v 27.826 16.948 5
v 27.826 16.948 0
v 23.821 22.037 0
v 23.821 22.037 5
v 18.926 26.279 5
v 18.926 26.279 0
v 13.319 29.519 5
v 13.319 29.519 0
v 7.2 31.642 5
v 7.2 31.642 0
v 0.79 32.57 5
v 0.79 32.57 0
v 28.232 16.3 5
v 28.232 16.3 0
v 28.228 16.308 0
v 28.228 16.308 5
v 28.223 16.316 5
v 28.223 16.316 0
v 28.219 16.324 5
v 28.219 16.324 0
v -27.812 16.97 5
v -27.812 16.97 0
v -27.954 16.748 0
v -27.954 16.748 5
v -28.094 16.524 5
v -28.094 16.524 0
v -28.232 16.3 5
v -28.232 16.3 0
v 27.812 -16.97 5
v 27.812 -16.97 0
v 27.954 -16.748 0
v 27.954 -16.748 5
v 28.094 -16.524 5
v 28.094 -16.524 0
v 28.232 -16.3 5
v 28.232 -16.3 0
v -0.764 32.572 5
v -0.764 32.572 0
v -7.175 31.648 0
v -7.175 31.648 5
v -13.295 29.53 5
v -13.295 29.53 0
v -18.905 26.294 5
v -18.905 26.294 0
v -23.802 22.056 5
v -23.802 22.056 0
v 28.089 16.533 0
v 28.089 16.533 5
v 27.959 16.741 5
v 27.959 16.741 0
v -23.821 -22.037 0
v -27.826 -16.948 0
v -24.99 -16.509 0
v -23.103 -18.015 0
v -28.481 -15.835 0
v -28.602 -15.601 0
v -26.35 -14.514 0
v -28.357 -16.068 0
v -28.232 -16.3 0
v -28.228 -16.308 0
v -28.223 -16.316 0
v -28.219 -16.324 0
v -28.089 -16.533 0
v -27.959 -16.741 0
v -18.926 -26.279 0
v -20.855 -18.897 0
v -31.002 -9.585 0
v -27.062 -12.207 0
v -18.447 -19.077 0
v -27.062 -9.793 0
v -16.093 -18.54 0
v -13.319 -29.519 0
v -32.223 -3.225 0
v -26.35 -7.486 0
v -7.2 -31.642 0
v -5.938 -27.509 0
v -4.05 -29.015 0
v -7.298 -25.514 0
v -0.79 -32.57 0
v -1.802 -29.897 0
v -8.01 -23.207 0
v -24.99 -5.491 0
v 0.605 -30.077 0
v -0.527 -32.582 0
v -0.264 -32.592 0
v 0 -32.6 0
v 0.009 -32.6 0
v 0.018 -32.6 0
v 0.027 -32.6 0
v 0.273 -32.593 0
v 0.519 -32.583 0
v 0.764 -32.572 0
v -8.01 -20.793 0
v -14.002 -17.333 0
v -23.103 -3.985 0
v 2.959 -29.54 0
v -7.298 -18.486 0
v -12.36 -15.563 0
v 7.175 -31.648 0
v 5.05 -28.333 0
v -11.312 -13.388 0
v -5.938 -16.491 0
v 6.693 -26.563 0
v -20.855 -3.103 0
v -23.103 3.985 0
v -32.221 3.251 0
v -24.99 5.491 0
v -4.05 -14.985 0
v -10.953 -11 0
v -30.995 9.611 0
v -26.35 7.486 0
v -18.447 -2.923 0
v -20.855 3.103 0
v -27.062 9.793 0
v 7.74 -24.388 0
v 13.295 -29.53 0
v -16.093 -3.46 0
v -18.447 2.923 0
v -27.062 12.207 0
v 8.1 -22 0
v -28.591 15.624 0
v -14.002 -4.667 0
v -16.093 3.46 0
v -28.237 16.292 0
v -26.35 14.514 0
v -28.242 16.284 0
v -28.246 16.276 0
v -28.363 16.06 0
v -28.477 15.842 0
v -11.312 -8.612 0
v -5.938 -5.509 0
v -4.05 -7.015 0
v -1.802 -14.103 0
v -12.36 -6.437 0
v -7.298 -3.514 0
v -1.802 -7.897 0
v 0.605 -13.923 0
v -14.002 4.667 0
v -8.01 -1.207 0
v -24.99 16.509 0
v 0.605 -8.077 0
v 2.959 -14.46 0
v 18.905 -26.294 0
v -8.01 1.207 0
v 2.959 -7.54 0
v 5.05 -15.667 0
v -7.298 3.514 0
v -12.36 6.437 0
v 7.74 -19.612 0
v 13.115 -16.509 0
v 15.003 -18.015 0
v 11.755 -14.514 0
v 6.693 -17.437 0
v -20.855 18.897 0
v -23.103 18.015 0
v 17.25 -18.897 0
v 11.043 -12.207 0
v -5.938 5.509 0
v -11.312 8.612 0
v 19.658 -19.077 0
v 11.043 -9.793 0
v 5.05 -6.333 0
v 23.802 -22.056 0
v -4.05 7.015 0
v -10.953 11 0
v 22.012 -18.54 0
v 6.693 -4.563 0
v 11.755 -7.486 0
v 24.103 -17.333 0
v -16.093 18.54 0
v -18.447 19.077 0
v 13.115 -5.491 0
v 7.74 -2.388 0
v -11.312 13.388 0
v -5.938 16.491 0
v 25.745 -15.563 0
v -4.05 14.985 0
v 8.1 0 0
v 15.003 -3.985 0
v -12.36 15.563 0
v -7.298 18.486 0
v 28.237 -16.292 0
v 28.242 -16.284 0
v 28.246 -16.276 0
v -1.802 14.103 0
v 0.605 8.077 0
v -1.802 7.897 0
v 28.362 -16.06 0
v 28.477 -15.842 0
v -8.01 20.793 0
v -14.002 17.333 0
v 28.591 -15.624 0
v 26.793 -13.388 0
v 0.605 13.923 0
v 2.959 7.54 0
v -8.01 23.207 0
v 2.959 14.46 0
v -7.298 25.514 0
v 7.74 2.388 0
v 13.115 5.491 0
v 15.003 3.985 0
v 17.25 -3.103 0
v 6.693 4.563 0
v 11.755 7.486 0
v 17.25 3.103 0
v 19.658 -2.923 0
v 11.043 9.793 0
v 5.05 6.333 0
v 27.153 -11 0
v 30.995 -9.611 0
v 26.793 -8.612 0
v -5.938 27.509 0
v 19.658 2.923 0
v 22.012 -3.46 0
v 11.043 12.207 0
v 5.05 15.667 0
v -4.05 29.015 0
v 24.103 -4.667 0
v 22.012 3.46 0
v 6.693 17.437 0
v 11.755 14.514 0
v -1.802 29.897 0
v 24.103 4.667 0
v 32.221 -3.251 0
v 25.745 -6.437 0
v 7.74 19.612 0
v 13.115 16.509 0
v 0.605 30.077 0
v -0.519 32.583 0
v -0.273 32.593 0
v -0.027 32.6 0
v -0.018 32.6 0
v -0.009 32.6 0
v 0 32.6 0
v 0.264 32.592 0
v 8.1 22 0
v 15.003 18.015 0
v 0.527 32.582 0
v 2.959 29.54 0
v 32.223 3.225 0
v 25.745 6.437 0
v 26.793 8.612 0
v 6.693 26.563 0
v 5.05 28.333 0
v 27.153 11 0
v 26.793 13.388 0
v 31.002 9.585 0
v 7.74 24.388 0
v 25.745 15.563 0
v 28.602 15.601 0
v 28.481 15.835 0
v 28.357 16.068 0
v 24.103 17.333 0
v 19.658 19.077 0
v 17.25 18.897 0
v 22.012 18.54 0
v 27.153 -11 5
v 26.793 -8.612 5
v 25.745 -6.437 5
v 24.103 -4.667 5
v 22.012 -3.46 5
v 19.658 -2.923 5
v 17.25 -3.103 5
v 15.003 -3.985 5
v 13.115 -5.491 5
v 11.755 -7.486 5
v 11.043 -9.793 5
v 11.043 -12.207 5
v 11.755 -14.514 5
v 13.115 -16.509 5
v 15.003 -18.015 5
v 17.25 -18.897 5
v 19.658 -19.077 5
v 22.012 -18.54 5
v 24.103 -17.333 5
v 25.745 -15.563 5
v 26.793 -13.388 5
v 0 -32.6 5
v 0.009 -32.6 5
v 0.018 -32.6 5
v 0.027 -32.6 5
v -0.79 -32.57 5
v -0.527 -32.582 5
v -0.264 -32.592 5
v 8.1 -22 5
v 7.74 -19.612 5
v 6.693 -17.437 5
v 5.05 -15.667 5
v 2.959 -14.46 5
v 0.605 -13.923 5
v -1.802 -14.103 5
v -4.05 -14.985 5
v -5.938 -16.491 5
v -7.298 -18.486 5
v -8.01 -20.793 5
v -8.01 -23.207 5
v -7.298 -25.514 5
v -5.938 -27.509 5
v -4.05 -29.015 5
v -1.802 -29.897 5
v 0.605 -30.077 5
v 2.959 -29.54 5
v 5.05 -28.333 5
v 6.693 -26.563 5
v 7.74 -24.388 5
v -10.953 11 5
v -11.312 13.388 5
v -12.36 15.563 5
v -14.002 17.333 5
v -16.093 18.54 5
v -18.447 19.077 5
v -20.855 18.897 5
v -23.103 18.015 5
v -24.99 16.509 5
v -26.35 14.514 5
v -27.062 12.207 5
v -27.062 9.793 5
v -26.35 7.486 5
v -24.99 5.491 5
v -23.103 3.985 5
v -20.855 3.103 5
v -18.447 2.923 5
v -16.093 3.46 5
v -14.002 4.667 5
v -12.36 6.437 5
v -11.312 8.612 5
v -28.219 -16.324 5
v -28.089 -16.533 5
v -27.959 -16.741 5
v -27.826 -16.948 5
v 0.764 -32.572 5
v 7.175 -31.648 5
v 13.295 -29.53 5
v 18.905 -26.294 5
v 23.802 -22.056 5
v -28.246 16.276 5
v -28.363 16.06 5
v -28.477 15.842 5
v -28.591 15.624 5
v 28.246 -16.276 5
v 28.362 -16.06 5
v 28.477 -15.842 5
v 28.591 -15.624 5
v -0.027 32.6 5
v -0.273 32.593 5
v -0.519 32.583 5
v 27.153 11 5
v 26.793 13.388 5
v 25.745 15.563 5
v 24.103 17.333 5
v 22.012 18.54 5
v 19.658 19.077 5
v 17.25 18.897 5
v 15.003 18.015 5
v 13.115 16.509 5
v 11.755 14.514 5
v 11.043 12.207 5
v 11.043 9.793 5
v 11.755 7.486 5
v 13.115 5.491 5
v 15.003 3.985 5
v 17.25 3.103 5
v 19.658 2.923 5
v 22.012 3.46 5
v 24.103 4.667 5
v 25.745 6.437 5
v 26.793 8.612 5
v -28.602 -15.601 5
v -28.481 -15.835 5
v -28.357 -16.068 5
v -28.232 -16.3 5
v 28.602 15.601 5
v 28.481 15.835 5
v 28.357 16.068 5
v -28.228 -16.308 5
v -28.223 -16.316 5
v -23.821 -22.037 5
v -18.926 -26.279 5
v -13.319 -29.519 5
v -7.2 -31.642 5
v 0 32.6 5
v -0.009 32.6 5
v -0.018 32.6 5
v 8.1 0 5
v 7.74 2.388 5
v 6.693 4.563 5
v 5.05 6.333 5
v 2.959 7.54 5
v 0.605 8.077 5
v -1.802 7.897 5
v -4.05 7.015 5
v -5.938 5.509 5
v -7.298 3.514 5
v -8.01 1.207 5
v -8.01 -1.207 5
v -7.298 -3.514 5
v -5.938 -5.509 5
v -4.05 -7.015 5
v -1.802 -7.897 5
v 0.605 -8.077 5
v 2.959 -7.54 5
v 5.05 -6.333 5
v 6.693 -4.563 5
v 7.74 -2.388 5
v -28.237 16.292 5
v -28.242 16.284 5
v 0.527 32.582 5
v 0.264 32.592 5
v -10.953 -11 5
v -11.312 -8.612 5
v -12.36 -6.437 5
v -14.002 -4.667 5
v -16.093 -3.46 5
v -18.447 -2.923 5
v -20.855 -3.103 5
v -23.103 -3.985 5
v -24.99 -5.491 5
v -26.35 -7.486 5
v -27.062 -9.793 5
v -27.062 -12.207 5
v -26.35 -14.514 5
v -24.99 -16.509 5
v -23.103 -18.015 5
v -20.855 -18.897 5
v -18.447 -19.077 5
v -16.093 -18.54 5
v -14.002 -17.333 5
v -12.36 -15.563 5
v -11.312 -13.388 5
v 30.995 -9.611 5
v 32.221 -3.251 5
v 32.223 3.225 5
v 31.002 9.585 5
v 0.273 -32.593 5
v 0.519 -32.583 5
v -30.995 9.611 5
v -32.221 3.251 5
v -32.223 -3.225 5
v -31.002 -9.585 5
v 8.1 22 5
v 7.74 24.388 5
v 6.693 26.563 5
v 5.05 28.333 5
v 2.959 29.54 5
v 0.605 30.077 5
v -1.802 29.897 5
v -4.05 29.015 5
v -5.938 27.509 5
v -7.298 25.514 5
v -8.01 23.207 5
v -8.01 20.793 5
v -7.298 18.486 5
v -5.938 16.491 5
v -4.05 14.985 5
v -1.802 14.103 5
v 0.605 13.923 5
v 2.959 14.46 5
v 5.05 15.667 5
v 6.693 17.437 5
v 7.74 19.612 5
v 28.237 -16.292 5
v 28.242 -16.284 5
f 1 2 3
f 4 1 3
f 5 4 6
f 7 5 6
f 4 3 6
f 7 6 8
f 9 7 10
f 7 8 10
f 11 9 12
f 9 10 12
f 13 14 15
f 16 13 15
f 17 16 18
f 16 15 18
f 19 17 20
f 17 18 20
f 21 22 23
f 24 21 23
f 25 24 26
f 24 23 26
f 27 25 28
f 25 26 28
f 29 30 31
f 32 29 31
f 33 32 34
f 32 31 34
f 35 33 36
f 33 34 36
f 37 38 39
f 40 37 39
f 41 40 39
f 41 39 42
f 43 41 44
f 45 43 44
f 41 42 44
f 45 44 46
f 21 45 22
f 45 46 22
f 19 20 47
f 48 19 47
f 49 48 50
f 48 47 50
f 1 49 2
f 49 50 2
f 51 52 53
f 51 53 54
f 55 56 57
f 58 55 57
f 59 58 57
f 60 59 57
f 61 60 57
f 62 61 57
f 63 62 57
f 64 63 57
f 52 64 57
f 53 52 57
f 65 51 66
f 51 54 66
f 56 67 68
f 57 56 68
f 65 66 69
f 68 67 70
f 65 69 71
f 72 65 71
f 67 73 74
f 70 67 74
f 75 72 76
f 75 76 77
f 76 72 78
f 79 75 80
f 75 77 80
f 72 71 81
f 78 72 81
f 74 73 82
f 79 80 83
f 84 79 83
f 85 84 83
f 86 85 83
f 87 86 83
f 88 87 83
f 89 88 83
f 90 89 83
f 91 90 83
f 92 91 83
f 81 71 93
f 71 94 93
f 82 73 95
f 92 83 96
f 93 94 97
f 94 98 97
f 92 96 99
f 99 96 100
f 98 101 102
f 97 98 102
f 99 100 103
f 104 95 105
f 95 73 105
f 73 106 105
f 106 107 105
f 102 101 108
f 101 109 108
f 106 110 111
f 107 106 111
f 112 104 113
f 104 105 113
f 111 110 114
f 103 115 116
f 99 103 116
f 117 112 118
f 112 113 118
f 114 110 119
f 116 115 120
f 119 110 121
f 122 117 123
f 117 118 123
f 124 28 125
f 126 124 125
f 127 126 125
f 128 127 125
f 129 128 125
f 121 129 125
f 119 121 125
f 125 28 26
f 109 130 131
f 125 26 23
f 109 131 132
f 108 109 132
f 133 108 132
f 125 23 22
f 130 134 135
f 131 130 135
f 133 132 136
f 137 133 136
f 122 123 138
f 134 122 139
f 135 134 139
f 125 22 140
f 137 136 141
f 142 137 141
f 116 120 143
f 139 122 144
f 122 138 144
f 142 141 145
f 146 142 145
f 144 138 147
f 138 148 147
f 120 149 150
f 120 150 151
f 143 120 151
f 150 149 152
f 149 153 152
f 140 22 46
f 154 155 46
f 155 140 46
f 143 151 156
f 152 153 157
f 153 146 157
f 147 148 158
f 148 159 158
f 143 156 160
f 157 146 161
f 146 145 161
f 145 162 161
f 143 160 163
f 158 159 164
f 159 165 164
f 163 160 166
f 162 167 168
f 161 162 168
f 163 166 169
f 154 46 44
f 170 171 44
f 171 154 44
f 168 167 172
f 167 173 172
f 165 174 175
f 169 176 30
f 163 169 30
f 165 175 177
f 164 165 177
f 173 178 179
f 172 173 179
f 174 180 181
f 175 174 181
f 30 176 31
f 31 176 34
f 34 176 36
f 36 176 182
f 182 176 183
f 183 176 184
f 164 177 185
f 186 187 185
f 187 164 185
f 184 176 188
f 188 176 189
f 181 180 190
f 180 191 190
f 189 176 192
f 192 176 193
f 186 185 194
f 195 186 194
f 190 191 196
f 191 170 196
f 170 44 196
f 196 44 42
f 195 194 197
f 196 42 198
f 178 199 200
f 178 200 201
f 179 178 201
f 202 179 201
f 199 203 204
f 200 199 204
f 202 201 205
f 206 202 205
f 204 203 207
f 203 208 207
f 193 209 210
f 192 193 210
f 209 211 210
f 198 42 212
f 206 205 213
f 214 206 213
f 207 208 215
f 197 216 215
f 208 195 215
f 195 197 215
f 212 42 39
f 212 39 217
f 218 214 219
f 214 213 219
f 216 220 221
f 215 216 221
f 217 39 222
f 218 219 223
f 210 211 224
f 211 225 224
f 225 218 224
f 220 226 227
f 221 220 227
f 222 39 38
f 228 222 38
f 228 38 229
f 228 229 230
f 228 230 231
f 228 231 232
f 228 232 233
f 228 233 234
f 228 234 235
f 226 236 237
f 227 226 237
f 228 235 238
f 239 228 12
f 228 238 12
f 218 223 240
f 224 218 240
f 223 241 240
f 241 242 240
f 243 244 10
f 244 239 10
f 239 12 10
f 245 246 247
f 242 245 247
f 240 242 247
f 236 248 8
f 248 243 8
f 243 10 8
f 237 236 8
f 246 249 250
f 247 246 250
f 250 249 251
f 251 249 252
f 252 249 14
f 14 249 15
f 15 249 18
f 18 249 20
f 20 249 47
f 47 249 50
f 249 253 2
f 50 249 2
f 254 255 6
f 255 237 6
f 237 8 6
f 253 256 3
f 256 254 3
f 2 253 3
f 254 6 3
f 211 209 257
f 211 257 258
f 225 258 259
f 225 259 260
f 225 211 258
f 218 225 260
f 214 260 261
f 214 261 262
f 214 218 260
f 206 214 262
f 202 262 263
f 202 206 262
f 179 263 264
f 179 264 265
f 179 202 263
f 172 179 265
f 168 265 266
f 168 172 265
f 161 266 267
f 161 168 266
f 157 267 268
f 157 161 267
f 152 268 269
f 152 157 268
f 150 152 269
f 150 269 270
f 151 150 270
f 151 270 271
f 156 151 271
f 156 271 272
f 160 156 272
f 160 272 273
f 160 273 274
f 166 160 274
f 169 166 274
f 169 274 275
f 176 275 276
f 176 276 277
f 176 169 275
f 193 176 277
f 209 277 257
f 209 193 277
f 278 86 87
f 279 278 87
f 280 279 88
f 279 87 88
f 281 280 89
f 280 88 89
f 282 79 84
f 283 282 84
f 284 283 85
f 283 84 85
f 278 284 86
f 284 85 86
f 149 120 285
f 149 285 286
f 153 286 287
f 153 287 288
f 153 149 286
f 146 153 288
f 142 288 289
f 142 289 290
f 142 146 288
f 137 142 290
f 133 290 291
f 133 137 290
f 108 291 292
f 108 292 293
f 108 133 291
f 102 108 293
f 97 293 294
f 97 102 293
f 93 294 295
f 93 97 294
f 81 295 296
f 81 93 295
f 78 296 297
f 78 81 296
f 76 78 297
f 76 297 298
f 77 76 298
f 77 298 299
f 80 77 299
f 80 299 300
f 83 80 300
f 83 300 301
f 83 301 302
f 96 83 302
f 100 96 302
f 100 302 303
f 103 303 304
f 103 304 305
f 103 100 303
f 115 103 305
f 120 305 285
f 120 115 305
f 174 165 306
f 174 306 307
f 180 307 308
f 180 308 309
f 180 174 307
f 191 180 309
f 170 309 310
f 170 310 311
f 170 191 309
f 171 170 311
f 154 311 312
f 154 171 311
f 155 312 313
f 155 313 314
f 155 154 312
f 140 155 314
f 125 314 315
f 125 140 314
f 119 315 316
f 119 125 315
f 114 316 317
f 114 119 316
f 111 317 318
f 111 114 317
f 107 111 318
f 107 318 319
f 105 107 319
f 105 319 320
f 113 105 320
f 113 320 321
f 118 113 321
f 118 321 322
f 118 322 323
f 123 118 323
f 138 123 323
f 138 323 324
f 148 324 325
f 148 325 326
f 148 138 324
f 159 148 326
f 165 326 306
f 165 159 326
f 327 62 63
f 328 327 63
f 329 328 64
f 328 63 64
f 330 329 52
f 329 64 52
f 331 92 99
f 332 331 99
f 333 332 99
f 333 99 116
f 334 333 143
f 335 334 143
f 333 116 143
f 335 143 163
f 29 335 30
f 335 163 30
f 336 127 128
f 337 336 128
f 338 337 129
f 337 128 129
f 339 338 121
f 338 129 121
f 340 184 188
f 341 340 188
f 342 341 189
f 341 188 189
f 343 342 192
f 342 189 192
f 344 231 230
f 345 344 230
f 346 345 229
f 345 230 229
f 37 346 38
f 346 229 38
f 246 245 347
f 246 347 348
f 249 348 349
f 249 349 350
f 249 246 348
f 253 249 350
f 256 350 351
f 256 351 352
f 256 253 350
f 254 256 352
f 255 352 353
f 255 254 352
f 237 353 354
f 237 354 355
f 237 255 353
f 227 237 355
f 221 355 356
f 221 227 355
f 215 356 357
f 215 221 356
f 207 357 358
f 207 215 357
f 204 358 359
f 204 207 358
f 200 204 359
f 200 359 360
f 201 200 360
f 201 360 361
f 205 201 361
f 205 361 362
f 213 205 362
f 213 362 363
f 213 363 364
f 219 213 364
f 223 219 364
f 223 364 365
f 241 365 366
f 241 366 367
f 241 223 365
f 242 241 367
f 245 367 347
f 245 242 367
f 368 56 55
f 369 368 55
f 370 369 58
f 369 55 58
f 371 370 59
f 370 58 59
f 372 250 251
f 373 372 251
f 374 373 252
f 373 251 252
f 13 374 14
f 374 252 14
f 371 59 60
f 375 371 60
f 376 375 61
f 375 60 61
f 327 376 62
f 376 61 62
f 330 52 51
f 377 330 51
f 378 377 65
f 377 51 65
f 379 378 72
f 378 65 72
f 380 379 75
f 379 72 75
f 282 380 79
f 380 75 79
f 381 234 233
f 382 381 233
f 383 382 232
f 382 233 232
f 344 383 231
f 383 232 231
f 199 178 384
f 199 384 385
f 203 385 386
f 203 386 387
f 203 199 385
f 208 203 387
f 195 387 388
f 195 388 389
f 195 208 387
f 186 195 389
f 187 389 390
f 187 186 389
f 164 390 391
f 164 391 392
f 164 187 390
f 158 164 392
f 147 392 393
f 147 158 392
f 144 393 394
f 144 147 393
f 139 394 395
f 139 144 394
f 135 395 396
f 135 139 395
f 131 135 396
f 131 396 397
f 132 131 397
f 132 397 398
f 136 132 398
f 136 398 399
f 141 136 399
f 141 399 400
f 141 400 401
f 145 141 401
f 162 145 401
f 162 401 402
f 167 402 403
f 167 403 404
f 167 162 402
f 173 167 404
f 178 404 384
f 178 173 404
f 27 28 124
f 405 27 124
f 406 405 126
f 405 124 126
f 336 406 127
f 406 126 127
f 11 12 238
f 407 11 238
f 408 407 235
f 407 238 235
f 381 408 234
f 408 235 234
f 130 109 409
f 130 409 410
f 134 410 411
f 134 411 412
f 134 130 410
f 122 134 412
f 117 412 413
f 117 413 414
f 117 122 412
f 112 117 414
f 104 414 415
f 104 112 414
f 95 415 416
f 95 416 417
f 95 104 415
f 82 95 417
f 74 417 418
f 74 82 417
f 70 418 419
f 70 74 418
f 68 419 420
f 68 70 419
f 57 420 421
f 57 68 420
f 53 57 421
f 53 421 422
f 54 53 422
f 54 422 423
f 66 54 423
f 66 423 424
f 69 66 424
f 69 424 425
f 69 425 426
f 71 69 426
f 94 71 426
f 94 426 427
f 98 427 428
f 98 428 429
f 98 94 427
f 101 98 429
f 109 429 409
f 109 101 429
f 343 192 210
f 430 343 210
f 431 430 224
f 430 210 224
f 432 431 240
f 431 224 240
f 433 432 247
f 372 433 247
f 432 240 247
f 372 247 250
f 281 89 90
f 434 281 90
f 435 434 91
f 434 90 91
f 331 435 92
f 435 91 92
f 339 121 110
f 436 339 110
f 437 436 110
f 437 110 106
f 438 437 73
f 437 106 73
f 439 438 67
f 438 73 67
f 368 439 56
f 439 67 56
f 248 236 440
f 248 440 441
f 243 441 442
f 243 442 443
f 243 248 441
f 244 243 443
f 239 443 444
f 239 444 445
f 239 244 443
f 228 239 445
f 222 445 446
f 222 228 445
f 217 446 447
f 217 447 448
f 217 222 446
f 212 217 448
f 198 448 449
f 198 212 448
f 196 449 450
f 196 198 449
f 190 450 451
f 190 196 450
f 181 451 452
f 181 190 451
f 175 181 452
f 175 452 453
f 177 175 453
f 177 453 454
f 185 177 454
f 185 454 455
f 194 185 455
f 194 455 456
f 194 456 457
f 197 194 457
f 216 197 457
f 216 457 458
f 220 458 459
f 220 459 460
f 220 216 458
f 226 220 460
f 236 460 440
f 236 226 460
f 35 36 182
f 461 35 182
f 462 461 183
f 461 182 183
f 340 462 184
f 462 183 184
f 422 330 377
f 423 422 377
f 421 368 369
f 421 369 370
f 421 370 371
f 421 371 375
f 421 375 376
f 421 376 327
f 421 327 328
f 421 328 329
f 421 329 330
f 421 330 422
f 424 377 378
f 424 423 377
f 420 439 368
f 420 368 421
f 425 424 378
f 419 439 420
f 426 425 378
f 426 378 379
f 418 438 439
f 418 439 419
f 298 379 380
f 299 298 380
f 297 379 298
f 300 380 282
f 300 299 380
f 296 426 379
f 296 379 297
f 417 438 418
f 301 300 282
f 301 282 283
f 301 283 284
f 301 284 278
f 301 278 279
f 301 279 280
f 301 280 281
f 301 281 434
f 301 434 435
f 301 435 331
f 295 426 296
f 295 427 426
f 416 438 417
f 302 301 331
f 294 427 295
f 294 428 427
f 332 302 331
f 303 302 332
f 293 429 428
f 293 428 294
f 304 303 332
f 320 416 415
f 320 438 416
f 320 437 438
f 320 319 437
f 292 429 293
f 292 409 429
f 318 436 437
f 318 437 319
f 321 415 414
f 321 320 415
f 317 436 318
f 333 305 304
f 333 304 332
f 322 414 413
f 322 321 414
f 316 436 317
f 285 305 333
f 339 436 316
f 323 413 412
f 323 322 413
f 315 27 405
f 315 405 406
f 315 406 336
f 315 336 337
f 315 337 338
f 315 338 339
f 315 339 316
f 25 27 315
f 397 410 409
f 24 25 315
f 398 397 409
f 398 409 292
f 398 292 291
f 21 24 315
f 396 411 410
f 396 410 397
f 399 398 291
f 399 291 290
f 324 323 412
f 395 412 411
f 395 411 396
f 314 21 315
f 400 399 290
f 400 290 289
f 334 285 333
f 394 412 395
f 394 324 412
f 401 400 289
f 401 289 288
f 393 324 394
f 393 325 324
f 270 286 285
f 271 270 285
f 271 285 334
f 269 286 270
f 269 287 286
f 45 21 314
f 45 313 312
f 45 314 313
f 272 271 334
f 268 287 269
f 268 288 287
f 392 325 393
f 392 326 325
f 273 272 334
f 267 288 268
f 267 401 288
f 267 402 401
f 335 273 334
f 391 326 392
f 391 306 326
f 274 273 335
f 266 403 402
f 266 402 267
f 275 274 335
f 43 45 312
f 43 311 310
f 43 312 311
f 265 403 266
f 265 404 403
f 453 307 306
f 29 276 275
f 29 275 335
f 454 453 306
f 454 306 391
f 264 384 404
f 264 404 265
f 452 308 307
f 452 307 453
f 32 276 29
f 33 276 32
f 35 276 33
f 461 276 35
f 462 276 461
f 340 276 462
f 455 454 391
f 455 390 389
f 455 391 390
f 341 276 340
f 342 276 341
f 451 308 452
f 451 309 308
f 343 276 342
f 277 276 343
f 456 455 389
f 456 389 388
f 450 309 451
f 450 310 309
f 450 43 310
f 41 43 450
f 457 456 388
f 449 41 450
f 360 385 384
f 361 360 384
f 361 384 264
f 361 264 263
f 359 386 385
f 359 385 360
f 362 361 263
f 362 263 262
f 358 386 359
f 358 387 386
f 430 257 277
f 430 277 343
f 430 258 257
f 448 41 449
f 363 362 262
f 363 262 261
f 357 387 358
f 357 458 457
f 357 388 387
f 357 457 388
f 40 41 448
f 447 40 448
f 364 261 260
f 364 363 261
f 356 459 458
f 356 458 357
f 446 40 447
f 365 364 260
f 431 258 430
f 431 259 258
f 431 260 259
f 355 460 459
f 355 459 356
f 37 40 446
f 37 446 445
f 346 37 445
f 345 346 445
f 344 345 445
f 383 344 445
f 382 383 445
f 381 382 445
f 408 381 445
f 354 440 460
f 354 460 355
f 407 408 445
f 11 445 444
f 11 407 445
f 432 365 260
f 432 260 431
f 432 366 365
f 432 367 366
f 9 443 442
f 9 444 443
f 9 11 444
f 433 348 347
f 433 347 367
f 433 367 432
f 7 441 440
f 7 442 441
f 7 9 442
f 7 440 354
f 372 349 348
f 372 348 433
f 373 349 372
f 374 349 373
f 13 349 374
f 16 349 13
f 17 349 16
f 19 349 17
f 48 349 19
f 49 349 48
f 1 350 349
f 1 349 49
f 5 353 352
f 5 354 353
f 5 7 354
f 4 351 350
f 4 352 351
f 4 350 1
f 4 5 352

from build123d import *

# Parameters (mm, degrees)
F0_R     = 10.6
F1_DEPTH = 5
F0_R_2   = 8.1
F2_DEPTH = 5


# Not quite as in the source:
# - ends of sketch curves that miss each other by under 0.0002 mm in the source are joined


with BuildPart() as f1:
    # F0 (on Top) → F1 (new body)
    with BuildSketch(Plane.XY):
        with BuildLine():
            ThreePointArc((27.8263414504, 16.9481692723), (16.199467196, 28.0319950031), (0.7904601582, 32.5704859273))
            ThreePointArc((0.7904601582, 32.5704859273), (7.7697772708, 29.2104480555), (10.6, 22))
            ThreePointArc((10.6, 22), (-7.2200130901, 14.2391101684), (-0.7644171658, 32.5724011651))
            ThreePointArc((-0.7644171658, 32.5724011651), (-16.1766867062, 28.0451473253), (-27.8116156006, 16.9698365243))
            ThreePointArc((-27.8116156006, 16.9698365243), (-15.9289393792, 21.1293147465), (-8.4525595083, 11.0000009845))
            ThreePointArc((-8.4525595083, 11.0000009845), (-21.4248089079, 0.6688619967), (-28.5907543736, 15.6241591469))
            ThreePointArc((-28.5907543736, 15.6241591469), (-32.3761533963, 0.0131339969), (-28.6021197402, -15.6006426749))
            ThreePointArc((-28.6021197402, -15.6006426749), (-21.4120811641, -0.665945501), (-8.4525606734, -10.9999990645))
            ThreePointArc((-8.4525606734, -10.9999990645), (-15.9414195658, -21.1331526215), (-27.8262967127, -16.9482387968))
            ThreePointArc((-27.8262967127, -16.9482387968), (-16.1994359735, -28.0320130446), (-0.7904706999, -32.5704854113))
            ThreePointArc((-0.7904706999, -32.5704854113), (-7.2104473679, -14.2302200266), (10.5999976698, -22.0000000981))
            ThreePointArc((10.5999976698, -22.0000000981), (7.7608872989, -29.2200134059), (0.7644142424, -32.5724013061))
            ThreePointArc((0.7644142424, -32.5724013061), (16.17671692, -28.045129896), (27.8116549786, -16.9697754267))
            ThreePointArc((27.8116549786, -16.9697754267), (8.9232325044, -7.8764163379), (29.652557178, -11.0000010826))
            ThreePointArc((29.652557178, -11.0000010826), (29.3836867135, -13.3722916469), (28.5907151929, -15.6242352553))
            ThreePointArc((28.5907151929, -15.6242352553), (32.3761533958, -0.0131351765), (28.6020816932, 15.6007167134))
            ThreePointArc((28.6020816932, 15.6007167134), (29.3866027477, 13.3595595706), (29.6525583432, 10.9999989665))
            ThreePointArc((29.6525583432, 10.9999989665), (8.9193924771, 7.8888979505), (27.8263414504, 16.9481692723))
        make_face()
        Circle(F0_R, mode=Mode.SUBTRACT)
    extrude(amount=F1_DEPTH)

    # F0 (on Top) → F2 (join)
    with BuildSketch(Plane.XY):
        with BuildLine():
            ThreePointArc((28.2460392226, -16.2763527502), (28.4201387166, -15.9512250463), (28.5907151929, -15.6242352553))
            ThreePointArc((28.5907151929, -15.6242352553), (29.3836867135, -13.3722916469), (29.652557178, -11.0000010826))
            ThreePointArc((29.652557178, -11.0000010826), (8.9232325044, -7.8764163379), (27.8116549786, -16.9697754267))
            ThreePointArc((27.8116549786, -16.9697754267), (28.023981709, -16.6361065668), (28.2324281634, -16.3))
            ThreePointArc((28.2324281634, -16.3), (28.2392409163, -16.2881805324), (28.2460392226, -16.2763527502))
        make_face()
        with Locations((19.052557178, -11.0000010826)):
            Circle(F0_R_2, mode=Mode.SUBTRACT)
        with BuildLine():
            ThreePointArc((28.2187545739, 16.3236111479), (28.0242350806, 16.636950204), (27.8263414504, 16.9481692723))
            ThreePointArc((27.8263414504, 16.9481692723), (8.9193924771, 7.8888979505), (29.6525583432, 10.9999989665))
            ThreePointArc((29.6525583432, 10.9999989665), (29.3866027477, 13.3595595706), (28.6020816932, 15.6007167134))
            ThreePointArc((28.6020816932, 15.6007167134), (28.4192805282, 15.9514291247), (28.2324281634, 16.3))
            ThreePointArc((28.2324281634, 16.3), (28.2255985395, 16.3118097271), (28.2187545739, 16.3236111479))
        make_face()
        with Locations((19.0525583432, 10.9999989665)):
            Circle(F0_R_2, mode=Mode.SUBTRACT)
        with BuildLine():
            ThreePointArc((0.0272846487, -32.5999638982), (0.3959239022, -32.5881738584), (0.7644142424, -32.5724013061))
            ThreePointArc((0.7644142424, -32.5724013061), (7.7608872989, -29.2200134059), (10.5999976698, -22.0000000981))
            ThreePointArc((10.5999976698, -22.0000000981), (-7.2104473679, -14.2302200266), (-0.7904706999, -32.5704854113))
            ThreePointArc((-0.7904706999, -32.5704854113), (-0.3953208493, -32.5875325821), (0, -32.6))
            ThreePointArc((0, -32.6), (0.013642337, -32.5999913161), (0.0272846487, -32.5999638982))
        make_face()
        with Locations((-2.3302e-06, -22.0000000981)):
            Circle(F0_R_2, mode=Mode.SUBTRACT)
        Circle(F0_R)
        Circle(F0_R_2, mode=Mode.SUBTRACT)
        with BuildLine():
            ThreePointArc((-8.4525606734, -10.9999990645), (-21.4120811641, -0.665945501), (-28.6021197402, -15.6006426749))
            ThreePointArc((-28.6021197402, -15.6006426749), (-28.4192999794, -15.9513923284), (-28.2324281634, -16.3))
            ThreePointArc((-28.2324281634, -16.3), (-28.2256003271, -16.3118107622), (-28.218756359, -16.3236121847))
            ThreePointArc((-28.218756359, -16.3236121847), (-28.0242130887, -16.6369852059), (-27.8262967127, -16.9482387968))
            ThreePointArc((-27.8262967127, -16.9482387968), (-15.9414195658, -21.1331526215), (-8.4525606734, -10.9999990645))
        make_face()
        with Locations((-19.0525606734, -10.9999990645)):
            Circle(F0_R_2, mode=Mode.SUBTRACT)
        with BuildLine():
            ThreePointArc((-8.4525595083, 11.0000009845), (-15.9289393792, 21.1293147465), (-27.8116156006, 16.9698365243))
            ThreePointArc((-27.8116156006, 16.9698365243), (-28.0239623753, 16.6361373416), (-28.2324281634, 16.3))
            ThreePointArc((-28.2324281634, 16.3), (-28.2392426242, 16.2881815155), (-28.2460409731, 16.2763537548))
            ThreePointArc((-28.2460409731, 16.2763537548), (-28.420158717, 15.951187206), (-28.5907543736, 15.6241591469))
            ThreePointArc((-28.5907543736, 15.6241591469), (-21.4248089079, 0.6688619967), (-8.4525595083, 11.0000009845))
        make_face()
        with Locations((-19.0525595083, 11.0000009845)):
            Circle(F0_R_2, mode=Mode.SUBTRACT)
        with BuildLine():
            ThreePointArc((0.7904601582, 32.5704859273), (0.3953155758, 32.587532779), (0, 32.6))
            ThreePointArc((0, 32.6), (-0.0136423369, 32.5999912211), (-0.0272846512, 32.5999648843))
            ThreePointArc((-0.0272846512, 32.5999648843), (-0.3959253645, 32.5881738038), (-0.7644171658, 32.5724011651))
            ThreePointArc((-0.7644171658, 32.5724011651), (-7.2200130901, 14.2391101684), (10.6, 22))
            ThreePointArc((10.6, 22), (7.7697772708, 29.2104480555), (0.7904601582, 32.5704859273))
        make_face()
        with Locations((0, 22)):
            Circle(F0_R_2, mode=Mode.SUBTRACT)
    extrude(amount=F2_DEPTH)


solid = f1.part
